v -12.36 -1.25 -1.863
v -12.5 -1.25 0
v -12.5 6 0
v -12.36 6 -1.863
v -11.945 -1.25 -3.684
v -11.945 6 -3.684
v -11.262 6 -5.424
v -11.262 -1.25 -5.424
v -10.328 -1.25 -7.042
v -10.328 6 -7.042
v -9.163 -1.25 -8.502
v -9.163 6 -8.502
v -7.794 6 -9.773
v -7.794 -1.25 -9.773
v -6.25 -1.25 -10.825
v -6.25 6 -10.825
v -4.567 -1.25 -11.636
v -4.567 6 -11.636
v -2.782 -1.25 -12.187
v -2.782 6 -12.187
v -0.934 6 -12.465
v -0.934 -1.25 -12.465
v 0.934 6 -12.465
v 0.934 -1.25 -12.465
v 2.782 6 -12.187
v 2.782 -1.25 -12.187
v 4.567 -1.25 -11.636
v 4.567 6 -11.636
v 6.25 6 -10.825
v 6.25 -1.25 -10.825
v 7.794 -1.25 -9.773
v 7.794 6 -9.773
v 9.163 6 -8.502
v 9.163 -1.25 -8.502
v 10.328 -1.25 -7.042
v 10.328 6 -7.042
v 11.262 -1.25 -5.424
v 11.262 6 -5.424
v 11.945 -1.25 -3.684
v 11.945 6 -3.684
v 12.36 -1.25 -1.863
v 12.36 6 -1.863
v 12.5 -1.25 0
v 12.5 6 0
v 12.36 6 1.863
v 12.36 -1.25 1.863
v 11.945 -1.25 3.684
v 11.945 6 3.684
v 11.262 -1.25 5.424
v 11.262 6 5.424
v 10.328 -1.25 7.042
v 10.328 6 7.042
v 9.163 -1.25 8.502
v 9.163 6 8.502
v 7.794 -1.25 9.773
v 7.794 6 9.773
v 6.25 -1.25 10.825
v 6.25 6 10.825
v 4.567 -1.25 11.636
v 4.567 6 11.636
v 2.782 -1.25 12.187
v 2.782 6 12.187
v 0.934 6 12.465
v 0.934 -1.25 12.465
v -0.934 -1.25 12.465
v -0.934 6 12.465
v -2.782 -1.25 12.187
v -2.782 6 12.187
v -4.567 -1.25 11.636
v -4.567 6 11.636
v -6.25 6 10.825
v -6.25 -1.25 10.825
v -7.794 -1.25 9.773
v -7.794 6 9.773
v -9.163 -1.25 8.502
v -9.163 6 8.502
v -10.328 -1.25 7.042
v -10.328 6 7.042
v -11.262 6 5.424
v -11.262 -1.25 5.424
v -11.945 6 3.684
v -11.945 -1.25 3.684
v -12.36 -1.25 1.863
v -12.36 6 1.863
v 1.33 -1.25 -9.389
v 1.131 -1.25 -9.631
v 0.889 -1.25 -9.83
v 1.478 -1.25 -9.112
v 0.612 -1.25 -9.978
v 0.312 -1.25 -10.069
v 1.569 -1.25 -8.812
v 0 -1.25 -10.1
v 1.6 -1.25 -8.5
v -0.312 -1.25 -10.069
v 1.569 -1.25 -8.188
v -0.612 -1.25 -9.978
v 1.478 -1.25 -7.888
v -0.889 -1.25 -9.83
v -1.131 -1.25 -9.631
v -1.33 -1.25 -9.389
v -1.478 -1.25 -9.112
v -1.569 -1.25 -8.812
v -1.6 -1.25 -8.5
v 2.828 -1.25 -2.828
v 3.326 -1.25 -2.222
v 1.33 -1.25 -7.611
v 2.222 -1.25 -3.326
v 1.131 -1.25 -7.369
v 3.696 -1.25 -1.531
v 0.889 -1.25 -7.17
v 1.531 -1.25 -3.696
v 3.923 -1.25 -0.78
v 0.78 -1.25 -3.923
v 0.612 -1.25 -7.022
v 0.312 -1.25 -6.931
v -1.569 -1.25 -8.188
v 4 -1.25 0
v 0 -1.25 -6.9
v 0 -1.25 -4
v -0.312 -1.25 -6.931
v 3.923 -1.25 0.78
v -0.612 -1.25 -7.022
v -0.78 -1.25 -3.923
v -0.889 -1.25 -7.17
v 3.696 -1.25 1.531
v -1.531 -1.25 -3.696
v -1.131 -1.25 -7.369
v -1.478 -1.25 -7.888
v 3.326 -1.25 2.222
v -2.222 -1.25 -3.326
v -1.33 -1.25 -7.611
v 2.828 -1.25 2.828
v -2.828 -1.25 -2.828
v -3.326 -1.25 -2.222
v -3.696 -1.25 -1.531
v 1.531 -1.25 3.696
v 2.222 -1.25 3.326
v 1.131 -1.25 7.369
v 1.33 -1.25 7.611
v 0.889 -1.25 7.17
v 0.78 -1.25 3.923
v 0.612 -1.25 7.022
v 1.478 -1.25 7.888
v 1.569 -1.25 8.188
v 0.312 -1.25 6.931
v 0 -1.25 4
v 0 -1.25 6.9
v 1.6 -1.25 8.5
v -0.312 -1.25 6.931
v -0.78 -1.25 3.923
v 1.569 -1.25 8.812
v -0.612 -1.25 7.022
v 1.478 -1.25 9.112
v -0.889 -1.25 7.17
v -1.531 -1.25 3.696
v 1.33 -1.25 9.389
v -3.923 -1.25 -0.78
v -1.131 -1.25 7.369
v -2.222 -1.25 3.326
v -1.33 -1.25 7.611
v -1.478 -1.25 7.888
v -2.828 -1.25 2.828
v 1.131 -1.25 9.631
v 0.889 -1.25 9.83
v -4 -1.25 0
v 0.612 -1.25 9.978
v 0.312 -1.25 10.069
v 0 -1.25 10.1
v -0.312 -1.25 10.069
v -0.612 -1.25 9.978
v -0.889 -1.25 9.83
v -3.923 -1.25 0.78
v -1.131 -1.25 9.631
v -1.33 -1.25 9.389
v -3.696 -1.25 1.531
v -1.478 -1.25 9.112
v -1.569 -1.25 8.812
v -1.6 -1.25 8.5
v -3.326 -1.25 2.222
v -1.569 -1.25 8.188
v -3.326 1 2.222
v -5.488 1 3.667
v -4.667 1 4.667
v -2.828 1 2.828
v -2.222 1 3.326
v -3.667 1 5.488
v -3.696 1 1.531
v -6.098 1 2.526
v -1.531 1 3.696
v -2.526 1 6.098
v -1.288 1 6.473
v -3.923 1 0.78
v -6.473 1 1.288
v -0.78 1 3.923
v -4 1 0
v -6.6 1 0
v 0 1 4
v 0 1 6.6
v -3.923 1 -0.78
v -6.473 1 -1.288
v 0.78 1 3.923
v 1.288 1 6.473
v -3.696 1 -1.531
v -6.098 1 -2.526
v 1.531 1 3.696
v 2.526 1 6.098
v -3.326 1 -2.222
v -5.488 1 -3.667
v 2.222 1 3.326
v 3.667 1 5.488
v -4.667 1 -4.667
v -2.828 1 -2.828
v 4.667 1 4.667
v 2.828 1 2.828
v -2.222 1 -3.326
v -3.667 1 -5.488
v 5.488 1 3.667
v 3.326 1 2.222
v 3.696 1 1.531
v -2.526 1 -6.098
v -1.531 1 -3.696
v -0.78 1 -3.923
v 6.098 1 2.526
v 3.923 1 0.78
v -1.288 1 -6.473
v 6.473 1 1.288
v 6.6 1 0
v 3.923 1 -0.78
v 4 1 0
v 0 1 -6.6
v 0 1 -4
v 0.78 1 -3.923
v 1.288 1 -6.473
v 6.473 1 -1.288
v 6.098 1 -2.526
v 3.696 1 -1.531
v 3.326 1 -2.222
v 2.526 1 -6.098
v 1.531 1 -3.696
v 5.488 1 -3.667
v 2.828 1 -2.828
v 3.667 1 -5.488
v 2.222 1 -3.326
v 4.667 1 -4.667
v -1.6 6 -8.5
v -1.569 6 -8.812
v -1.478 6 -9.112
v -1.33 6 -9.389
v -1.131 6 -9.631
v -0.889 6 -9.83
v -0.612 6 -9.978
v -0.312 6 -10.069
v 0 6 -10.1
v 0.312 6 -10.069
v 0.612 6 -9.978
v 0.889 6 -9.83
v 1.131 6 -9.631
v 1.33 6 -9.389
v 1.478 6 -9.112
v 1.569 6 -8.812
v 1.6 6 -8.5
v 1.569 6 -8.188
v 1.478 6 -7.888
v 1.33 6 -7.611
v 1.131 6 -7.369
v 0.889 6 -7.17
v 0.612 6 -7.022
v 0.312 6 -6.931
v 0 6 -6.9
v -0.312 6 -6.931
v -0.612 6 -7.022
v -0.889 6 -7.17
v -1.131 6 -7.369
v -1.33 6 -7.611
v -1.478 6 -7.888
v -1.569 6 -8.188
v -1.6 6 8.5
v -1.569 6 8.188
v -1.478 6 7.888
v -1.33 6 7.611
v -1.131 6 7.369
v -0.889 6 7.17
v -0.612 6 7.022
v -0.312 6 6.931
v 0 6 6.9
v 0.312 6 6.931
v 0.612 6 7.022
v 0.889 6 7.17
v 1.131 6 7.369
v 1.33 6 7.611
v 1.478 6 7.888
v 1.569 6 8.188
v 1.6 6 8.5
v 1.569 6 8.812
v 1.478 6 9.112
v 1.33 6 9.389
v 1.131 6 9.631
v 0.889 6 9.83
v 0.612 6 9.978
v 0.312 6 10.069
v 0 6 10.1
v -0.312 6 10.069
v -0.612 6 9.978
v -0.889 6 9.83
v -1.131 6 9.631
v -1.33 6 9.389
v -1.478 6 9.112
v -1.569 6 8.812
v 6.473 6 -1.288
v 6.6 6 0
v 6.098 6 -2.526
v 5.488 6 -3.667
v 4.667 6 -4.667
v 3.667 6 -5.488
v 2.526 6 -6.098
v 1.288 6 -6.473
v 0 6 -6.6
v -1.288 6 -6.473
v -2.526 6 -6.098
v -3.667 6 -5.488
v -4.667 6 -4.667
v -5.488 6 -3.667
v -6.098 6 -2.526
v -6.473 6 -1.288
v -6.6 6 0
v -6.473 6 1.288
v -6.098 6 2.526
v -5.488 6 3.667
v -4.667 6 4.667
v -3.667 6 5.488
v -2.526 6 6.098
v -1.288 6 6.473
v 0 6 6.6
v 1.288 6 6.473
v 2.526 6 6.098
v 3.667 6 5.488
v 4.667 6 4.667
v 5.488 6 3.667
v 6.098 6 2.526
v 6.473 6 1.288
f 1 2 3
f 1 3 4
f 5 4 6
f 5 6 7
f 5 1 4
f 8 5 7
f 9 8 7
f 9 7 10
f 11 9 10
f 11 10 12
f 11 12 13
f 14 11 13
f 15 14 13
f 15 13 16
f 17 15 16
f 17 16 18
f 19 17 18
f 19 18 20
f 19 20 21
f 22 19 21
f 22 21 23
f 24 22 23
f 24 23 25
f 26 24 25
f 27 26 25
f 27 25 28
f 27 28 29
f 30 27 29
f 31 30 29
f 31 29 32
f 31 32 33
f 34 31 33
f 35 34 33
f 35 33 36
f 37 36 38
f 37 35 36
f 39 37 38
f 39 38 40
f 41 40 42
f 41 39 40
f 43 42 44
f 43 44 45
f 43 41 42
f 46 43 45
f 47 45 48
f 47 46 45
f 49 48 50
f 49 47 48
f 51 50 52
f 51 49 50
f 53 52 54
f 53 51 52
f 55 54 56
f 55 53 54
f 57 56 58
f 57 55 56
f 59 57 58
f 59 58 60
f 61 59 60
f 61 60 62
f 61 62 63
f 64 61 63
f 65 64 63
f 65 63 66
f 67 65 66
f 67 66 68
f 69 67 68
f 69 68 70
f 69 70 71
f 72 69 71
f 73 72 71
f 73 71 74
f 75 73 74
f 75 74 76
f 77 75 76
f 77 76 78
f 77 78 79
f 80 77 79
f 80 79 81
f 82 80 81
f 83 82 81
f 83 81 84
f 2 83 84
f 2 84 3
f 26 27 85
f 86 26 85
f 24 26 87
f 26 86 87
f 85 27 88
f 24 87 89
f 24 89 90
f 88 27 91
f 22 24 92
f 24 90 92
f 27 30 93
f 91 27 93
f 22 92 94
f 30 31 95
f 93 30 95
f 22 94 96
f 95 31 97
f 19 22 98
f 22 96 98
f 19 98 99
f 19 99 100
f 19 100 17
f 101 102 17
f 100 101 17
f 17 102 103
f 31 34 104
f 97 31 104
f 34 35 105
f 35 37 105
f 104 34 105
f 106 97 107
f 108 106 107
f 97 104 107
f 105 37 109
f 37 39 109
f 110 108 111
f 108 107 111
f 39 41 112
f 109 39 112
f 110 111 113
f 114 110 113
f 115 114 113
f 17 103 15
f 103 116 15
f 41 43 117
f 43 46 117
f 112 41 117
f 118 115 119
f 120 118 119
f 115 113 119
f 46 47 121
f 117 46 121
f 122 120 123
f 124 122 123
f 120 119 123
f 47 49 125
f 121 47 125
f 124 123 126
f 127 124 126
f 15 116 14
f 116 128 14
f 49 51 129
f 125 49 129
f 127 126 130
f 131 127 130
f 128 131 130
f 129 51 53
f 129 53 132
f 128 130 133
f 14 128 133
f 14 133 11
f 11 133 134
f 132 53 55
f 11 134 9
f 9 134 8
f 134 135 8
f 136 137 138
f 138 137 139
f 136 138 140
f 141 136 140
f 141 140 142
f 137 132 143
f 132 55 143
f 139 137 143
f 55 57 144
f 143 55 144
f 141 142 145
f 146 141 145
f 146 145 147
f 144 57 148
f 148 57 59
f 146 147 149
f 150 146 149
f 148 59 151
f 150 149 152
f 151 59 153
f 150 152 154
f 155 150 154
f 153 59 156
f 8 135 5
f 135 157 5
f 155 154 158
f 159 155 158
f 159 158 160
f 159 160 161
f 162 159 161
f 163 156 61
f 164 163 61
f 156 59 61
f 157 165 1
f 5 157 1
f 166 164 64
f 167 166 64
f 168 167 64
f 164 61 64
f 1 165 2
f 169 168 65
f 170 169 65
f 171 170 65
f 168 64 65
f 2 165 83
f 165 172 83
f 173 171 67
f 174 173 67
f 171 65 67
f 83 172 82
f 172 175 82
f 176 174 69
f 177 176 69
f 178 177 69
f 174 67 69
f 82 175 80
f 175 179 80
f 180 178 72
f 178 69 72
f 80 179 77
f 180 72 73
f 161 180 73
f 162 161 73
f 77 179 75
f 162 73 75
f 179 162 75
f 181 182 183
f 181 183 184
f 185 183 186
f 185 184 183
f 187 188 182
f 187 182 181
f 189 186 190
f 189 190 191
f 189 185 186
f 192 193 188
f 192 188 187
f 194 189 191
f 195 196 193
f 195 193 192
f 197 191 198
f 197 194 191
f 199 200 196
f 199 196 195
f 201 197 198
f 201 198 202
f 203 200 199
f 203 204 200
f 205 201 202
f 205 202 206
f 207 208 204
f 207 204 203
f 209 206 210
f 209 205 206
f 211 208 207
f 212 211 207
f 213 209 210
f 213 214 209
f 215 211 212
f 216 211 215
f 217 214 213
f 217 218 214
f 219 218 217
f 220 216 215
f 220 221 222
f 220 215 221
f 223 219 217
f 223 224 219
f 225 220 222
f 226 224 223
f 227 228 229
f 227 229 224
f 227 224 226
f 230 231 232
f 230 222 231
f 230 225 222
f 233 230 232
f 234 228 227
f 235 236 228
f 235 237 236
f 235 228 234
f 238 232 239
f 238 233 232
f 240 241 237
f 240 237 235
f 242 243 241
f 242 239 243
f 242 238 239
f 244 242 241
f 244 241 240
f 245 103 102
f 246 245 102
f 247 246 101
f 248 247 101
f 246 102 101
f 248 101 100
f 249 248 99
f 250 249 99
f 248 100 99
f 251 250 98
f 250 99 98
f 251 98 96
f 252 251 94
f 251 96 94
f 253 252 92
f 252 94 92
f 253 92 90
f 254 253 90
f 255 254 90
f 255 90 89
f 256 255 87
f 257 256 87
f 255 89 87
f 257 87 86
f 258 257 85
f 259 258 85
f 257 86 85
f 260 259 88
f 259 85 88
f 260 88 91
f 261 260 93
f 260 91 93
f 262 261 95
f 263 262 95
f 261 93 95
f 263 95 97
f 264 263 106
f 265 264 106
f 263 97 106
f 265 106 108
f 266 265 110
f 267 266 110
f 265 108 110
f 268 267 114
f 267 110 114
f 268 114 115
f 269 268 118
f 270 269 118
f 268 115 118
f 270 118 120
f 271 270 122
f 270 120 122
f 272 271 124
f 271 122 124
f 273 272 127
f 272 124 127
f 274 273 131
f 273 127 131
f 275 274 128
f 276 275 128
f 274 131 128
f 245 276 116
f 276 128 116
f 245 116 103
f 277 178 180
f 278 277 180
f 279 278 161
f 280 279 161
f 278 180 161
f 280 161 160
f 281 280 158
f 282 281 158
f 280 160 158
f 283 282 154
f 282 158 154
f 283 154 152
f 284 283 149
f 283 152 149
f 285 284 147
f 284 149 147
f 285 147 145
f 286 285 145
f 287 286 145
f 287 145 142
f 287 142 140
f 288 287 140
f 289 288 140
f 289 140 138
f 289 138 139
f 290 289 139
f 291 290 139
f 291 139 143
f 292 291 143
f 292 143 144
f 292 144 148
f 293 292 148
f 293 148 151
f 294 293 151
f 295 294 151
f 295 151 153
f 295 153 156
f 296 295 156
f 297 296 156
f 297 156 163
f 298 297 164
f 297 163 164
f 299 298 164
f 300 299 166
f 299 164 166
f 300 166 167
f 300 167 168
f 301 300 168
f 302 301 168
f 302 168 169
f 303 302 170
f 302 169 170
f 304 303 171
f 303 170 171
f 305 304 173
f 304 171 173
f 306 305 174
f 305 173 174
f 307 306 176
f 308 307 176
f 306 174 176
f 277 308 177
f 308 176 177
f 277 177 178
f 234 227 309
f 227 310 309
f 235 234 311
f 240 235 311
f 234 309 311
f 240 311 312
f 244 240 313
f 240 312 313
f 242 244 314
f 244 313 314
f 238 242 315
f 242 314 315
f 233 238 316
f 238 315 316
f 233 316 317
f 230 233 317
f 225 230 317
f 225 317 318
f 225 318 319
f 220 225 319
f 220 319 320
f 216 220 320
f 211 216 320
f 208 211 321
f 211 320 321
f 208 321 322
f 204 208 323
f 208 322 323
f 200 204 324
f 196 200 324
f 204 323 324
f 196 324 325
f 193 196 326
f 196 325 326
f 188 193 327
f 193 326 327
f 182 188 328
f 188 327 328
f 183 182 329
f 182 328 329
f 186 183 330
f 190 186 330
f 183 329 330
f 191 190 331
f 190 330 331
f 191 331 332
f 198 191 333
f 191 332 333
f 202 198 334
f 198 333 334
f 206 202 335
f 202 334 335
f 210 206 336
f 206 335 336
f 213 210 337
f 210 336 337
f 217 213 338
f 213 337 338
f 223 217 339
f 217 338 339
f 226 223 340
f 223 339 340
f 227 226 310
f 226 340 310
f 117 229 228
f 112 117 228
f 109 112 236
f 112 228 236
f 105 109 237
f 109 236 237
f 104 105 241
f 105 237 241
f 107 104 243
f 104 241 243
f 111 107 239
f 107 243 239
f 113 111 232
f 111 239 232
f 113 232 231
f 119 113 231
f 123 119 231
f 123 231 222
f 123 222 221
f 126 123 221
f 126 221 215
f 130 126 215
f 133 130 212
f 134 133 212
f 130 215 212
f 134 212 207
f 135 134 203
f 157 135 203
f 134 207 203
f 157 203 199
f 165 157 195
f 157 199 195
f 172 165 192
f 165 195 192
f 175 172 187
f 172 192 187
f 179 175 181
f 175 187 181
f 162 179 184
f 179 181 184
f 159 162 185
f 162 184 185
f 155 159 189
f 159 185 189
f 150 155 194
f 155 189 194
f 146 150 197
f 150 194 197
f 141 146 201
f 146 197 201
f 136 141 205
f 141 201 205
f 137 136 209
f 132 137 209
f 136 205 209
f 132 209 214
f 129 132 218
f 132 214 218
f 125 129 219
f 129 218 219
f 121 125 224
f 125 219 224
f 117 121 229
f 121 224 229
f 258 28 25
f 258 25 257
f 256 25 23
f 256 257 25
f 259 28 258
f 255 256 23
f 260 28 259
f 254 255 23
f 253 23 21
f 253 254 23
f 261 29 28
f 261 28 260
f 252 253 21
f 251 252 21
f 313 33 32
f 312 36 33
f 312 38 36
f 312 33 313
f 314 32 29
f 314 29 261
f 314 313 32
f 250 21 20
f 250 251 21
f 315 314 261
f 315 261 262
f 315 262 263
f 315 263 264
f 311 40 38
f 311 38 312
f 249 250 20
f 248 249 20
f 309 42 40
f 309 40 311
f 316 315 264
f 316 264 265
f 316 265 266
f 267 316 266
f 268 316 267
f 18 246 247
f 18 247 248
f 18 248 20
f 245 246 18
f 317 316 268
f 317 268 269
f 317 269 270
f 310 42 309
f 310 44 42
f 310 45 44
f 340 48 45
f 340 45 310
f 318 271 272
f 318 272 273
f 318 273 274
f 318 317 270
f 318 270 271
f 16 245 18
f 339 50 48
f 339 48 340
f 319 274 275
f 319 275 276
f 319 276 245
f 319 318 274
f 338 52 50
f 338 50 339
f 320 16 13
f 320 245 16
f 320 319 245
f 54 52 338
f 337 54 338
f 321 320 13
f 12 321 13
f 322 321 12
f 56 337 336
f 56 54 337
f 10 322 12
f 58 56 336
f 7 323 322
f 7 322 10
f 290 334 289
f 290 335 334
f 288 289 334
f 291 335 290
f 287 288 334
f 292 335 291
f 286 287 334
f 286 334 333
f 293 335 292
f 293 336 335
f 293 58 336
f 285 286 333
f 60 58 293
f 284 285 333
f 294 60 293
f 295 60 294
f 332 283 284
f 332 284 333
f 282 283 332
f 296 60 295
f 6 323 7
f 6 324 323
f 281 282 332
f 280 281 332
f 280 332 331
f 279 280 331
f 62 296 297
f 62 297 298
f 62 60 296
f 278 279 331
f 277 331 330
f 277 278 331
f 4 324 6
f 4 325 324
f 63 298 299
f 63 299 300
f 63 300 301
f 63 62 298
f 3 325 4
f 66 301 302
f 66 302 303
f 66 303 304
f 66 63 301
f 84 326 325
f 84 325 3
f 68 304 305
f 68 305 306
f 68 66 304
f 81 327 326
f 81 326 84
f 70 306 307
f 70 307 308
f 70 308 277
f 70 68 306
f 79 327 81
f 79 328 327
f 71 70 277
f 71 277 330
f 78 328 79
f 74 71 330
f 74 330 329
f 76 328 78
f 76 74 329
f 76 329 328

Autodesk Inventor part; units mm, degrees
ref_plane "YZ Plane" through (0, 0, 0) normal (1, 0, 0) x (0, 1, 0)
ref_plane "XZ Plane" through (0, 0, 0) normal (0, 1, 0) x (-1, 0, 0)
ref_plane "XY Plane" through (0, 0, 0) normal (0, 0, 1) x (1, 0, 0)
sketch "草圖1" plane through (0, 0, 0) normal (0, 1, 0) x (-1, 0, 0)
  circle A0 centre (0, 0) radius 12.5
  circle A1 centre (0, 8.5) radius 1.6
  circle A2 centre (0, -8.5) radius 1.6
  dimension "d0" = 25
  dimension "d1" = 17
  dimension "d2" = 8.5
  dimension "d3" = 3.2
  dimension "d4" = 3.2
extrude "擠出1" add sketch "草圖1" along normal blind 6
sketch "草圖2" plane through (0, 6, 0) normal (0, 1, 0) x (1, 0, 0)
  circle A0 centre (0, 0) radius 4
  dimension "d7" = 8
extrude "擠出2" cut sketch "草圖2" against normal through all
sketch "草圖3" plane through (0, 6, 0) normal (0, 1, 0) x (1, 0, 0)
  circle A0 centre (0, 0) radius 6.6
  dimension "d10" = 13.2
extrude "擠出3" cut sketch "草圖3" against normal blind 5
move faces "移動1" translate (0, -1.25, 0) faces at (3.5966, 0, -7.1119)
equation "\"d4\" = d3"
properties part number "wheel_base_cover_print"
